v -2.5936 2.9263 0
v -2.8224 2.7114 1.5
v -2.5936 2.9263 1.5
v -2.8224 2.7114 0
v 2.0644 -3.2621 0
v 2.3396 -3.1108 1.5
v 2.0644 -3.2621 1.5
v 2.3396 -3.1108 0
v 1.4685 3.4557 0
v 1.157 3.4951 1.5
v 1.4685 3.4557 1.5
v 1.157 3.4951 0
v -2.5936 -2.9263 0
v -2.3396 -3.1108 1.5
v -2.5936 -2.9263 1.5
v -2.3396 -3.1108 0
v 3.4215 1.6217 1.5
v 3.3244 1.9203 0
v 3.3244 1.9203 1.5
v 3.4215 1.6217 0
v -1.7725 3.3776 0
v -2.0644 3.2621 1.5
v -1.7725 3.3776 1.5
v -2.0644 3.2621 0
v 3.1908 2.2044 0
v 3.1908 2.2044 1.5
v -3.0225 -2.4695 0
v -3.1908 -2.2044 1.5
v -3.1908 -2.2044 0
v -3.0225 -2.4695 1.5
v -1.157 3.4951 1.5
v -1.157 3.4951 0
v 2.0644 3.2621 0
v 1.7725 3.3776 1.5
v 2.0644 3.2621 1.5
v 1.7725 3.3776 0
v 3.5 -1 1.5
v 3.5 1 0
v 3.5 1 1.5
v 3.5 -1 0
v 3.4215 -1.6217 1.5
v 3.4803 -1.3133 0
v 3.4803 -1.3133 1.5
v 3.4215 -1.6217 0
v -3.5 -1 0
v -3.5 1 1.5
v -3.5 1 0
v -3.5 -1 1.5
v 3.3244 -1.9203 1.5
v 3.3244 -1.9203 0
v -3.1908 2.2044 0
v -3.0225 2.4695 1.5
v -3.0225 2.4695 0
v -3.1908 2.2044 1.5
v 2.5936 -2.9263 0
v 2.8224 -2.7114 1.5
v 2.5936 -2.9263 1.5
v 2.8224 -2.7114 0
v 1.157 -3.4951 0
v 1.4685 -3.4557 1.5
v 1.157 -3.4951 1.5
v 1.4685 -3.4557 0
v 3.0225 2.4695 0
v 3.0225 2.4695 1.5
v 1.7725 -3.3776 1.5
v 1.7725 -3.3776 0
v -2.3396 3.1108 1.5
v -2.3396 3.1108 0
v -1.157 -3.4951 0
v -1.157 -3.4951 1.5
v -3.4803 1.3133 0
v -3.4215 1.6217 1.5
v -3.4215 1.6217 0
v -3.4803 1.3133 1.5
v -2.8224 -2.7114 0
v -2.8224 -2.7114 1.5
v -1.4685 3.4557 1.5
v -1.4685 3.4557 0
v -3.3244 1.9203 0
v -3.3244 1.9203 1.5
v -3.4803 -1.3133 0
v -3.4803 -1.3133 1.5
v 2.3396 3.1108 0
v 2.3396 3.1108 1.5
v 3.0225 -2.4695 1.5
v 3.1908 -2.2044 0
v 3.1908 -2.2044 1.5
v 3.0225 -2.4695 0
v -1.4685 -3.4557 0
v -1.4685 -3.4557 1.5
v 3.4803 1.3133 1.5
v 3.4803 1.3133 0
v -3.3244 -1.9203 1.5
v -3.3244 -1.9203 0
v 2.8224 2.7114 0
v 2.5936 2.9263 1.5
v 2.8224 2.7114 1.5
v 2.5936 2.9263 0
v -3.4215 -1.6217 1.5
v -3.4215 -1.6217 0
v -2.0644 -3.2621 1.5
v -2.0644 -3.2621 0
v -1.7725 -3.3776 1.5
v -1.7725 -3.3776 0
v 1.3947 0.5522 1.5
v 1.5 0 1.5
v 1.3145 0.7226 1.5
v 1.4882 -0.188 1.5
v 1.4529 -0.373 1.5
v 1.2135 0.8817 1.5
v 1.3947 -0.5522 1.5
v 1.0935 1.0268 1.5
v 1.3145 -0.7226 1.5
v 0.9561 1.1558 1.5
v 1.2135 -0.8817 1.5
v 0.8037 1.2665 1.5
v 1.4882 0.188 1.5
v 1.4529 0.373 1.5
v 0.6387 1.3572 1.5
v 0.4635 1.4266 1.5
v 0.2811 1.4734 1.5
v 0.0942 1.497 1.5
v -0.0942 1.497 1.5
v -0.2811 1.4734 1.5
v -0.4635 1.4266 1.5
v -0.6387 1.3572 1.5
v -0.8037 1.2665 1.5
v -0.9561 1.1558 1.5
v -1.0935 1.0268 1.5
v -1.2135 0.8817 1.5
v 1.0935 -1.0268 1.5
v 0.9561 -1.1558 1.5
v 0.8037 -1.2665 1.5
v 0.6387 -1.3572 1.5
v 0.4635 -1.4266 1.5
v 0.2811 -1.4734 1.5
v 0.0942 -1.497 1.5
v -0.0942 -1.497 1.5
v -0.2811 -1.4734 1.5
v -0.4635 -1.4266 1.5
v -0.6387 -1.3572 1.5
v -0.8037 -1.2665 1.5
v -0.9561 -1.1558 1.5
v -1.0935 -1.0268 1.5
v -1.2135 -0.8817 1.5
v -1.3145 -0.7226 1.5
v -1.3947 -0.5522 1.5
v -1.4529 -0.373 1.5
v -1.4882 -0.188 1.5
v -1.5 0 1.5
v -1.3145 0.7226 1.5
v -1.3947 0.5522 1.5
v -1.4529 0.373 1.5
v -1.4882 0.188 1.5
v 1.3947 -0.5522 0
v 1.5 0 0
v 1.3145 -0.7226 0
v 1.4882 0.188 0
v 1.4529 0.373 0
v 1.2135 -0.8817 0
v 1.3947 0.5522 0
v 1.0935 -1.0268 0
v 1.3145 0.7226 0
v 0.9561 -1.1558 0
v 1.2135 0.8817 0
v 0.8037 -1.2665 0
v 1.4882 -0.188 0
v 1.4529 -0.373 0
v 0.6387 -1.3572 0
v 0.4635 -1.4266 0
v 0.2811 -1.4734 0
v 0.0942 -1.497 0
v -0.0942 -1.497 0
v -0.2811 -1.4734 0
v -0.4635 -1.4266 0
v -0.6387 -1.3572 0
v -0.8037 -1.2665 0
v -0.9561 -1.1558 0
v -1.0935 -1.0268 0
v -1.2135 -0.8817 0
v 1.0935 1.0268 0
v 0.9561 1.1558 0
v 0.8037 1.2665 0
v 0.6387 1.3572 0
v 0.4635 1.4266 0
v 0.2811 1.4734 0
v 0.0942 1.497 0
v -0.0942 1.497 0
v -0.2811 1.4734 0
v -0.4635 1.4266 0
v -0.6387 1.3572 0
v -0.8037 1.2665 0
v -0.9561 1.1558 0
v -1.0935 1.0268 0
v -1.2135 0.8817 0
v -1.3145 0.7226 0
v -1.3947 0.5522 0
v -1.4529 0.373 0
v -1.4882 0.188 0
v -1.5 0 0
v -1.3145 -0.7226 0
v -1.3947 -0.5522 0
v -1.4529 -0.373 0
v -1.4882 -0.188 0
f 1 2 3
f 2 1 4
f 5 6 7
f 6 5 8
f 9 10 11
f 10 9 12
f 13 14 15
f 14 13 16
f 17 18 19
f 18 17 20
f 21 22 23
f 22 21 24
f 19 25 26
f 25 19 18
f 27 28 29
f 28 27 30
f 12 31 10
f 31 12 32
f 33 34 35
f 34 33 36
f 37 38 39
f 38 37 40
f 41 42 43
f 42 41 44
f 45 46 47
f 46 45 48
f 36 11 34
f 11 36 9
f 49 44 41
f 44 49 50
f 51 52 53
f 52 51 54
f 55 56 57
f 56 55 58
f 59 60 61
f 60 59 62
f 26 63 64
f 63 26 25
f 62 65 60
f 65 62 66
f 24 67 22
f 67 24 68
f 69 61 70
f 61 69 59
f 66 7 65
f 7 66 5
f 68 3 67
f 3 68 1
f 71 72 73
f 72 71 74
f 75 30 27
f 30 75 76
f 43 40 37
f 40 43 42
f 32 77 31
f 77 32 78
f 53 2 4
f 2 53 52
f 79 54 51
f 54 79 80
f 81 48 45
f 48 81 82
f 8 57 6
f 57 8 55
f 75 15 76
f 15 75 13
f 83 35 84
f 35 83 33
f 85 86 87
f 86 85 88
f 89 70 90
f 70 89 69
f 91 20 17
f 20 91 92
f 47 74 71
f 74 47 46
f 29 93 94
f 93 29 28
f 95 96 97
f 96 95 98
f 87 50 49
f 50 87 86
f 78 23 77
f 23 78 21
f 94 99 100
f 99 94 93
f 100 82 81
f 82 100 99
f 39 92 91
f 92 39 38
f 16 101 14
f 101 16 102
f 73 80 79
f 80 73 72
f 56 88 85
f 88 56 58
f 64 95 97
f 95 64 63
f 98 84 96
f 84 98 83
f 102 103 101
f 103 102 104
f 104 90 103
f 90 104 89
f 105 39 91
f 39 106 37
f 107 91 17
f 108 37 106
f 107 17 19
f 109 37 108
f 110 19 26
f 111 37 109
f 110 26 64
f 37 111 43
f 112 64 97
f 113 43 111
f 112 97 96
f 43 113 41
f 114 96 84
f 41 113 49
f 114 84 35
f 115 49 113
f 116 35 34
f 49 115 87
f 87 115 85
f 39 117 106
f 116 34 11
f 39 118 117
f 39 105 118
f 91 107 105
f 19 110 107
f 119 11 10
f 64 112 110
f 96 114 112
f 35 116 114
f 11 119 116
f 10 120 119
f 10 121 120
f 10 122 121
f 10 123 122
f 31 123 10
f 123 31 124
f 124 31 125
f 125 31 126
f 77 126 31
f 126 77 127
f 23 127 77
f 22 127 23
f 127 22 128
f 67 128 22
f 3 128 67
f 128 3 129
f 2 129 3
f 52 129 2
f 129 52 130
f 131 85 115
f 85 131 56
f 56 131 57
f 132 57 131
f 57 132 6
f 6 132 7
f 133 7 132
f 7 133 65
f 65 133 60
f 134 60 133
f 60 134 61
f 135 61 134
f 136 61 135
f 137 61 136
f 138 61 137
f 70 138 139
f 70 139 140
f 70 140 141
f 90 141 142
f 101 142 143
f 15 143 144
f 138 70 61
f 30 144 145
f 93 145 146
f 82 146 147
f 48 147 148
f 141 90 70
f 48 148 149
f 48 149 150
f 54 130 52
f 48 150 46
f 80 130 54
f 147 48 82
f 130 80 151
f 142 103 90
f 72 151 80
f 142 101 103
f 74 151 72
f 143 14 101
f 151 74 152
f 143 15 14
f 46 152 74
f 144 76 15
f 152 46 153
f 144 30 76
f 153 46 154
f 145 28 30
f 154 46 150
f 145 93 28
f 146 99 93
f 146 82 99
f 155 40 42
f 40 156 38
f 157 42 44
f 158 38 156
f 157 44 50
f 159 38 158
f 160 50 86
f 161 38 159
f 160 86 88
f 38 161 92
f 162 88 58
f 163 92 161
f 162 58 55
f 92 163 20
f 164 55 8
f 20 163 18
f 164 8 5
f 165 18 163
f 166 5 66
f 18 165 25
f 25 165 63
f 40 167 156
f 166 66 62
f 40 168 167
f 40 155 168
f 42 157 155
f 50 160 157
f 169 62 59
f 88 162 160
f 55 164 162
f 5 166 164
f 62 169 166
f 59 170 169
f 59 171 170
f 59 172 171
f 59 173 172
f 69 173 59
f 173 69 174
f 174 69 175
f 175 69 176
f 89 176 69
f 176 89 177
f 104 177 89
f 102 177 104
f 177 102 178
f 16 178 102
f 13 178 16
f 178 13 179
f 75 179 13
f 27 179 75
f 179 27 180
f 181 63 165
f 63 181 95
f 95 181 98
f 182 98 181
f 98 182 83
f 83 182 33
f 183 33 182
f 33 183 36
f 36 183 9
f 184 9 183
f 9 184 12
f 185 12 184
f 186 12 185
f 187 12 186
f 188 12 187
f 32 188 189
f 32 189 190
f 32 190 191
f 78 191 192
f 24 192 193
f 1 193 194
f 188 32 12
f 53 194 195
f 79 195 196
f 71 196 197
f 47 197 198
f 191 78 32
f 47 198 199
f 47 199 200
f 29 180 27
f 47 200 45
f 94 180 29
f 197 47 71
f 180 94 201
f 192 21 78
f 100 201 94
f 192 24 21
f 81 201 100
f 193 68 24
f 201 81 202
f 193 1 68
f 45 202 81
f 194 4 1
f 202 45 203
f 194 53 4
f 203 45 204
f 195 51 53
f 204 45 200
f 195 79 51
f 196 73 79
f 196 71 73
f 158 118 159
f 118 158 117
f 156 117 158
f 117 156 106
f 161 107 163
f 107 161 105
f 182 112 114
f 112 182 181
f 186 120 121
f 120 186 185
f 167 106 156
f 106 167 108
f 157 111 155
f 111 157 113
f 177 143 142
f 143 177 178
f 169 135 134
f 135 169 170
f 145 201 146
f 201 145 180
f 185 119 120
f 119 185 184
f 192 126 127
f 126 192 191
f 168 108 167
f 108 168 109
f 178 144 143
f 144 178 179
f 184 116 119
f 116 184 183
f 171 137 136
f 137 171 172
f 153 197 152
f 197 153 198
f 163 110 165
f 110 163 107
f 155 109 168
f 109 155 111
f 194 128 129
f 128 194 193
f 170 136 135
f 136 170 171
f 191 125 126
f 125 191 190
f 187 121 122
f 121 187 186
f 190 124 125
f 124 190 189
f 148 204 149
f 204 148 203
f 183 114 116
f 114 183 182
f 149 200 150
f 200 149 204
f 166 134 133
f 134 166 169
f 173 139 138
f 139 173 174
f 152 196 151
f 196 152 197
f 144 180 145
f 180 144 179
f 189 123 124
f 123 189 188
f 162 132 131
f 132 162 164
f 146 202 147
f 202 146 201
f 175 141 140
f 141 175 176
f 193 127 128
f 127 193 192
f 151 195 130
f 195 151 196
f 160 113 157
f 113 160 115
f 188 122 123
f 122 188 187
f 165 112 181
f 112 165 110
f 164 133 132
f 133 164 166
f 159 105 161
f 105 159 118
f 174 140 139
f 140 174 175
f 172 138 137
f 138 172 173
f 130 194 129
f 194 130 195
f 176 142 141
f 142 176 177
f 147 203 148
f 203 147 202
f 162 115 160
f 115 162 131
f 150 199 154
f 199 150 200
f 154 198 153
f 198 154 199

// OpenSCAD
$fn = 50;


difference() {
	union() {
		translate(v = [0, 0, 0]) {
			rotate(a = [0, 0, 0]) {
				hull() {
					translate(v = [-1.0000000000, 1.0000000000, 0]) {
						rotate(a = [0, 0, 0]) {
							translate(v = [0, 0, 0]) {
								rotate(a = [0, 0, 0]) {
									cylinder(h = 1.5000000000, r = 2.5000000000);
								}
							}
						}
					}
					translate(v = [1.0000000000, 1.0000000000, 0]) {
						rotate(a = [0, 0, 0]) {
							translate(v = [0, 0, 0]) {
								rotate(a = [0, 0, 0]) {
									cylinder(h = 1.5000000000, r = 2.5000000000);
								}
							}
						}
					}
					translate(v = [-1.0000000000, -1.0000000000, 0]) {
						rotate(a = [0, 0, 0]) {
							translate(v = [0, 0, 0]) {
								rotate(a = [0, 0, 0]) {
									cylinder(h = 1.5000000000, r = 2.5000000000);
								}
							}
						}
					}
					translate(v = [1.0000000000, -1.0000000000, 0]) {
						rotate(a = [0, 0, 0]) {
							translate(v = [0, 0, 0]) {
								rotate(a = [0, 0, 0]) {
									cylinder(h = 1.5000000000, r = 2.5000000000);
								}
							}
						}
					}
				}
			}
		}
	}
	union() {
		translate(v = [0.0000000000, 0.0000000000, 0]) {
			rotate(a = [0, 0, 0]) {
				translate(v = [0, 0, -50]) {
					rotate(a = [0, 0, 0]) {
						cylinder(h = 100, r = 1.5000000000);
					}
				}
			}
		}
	}
}
